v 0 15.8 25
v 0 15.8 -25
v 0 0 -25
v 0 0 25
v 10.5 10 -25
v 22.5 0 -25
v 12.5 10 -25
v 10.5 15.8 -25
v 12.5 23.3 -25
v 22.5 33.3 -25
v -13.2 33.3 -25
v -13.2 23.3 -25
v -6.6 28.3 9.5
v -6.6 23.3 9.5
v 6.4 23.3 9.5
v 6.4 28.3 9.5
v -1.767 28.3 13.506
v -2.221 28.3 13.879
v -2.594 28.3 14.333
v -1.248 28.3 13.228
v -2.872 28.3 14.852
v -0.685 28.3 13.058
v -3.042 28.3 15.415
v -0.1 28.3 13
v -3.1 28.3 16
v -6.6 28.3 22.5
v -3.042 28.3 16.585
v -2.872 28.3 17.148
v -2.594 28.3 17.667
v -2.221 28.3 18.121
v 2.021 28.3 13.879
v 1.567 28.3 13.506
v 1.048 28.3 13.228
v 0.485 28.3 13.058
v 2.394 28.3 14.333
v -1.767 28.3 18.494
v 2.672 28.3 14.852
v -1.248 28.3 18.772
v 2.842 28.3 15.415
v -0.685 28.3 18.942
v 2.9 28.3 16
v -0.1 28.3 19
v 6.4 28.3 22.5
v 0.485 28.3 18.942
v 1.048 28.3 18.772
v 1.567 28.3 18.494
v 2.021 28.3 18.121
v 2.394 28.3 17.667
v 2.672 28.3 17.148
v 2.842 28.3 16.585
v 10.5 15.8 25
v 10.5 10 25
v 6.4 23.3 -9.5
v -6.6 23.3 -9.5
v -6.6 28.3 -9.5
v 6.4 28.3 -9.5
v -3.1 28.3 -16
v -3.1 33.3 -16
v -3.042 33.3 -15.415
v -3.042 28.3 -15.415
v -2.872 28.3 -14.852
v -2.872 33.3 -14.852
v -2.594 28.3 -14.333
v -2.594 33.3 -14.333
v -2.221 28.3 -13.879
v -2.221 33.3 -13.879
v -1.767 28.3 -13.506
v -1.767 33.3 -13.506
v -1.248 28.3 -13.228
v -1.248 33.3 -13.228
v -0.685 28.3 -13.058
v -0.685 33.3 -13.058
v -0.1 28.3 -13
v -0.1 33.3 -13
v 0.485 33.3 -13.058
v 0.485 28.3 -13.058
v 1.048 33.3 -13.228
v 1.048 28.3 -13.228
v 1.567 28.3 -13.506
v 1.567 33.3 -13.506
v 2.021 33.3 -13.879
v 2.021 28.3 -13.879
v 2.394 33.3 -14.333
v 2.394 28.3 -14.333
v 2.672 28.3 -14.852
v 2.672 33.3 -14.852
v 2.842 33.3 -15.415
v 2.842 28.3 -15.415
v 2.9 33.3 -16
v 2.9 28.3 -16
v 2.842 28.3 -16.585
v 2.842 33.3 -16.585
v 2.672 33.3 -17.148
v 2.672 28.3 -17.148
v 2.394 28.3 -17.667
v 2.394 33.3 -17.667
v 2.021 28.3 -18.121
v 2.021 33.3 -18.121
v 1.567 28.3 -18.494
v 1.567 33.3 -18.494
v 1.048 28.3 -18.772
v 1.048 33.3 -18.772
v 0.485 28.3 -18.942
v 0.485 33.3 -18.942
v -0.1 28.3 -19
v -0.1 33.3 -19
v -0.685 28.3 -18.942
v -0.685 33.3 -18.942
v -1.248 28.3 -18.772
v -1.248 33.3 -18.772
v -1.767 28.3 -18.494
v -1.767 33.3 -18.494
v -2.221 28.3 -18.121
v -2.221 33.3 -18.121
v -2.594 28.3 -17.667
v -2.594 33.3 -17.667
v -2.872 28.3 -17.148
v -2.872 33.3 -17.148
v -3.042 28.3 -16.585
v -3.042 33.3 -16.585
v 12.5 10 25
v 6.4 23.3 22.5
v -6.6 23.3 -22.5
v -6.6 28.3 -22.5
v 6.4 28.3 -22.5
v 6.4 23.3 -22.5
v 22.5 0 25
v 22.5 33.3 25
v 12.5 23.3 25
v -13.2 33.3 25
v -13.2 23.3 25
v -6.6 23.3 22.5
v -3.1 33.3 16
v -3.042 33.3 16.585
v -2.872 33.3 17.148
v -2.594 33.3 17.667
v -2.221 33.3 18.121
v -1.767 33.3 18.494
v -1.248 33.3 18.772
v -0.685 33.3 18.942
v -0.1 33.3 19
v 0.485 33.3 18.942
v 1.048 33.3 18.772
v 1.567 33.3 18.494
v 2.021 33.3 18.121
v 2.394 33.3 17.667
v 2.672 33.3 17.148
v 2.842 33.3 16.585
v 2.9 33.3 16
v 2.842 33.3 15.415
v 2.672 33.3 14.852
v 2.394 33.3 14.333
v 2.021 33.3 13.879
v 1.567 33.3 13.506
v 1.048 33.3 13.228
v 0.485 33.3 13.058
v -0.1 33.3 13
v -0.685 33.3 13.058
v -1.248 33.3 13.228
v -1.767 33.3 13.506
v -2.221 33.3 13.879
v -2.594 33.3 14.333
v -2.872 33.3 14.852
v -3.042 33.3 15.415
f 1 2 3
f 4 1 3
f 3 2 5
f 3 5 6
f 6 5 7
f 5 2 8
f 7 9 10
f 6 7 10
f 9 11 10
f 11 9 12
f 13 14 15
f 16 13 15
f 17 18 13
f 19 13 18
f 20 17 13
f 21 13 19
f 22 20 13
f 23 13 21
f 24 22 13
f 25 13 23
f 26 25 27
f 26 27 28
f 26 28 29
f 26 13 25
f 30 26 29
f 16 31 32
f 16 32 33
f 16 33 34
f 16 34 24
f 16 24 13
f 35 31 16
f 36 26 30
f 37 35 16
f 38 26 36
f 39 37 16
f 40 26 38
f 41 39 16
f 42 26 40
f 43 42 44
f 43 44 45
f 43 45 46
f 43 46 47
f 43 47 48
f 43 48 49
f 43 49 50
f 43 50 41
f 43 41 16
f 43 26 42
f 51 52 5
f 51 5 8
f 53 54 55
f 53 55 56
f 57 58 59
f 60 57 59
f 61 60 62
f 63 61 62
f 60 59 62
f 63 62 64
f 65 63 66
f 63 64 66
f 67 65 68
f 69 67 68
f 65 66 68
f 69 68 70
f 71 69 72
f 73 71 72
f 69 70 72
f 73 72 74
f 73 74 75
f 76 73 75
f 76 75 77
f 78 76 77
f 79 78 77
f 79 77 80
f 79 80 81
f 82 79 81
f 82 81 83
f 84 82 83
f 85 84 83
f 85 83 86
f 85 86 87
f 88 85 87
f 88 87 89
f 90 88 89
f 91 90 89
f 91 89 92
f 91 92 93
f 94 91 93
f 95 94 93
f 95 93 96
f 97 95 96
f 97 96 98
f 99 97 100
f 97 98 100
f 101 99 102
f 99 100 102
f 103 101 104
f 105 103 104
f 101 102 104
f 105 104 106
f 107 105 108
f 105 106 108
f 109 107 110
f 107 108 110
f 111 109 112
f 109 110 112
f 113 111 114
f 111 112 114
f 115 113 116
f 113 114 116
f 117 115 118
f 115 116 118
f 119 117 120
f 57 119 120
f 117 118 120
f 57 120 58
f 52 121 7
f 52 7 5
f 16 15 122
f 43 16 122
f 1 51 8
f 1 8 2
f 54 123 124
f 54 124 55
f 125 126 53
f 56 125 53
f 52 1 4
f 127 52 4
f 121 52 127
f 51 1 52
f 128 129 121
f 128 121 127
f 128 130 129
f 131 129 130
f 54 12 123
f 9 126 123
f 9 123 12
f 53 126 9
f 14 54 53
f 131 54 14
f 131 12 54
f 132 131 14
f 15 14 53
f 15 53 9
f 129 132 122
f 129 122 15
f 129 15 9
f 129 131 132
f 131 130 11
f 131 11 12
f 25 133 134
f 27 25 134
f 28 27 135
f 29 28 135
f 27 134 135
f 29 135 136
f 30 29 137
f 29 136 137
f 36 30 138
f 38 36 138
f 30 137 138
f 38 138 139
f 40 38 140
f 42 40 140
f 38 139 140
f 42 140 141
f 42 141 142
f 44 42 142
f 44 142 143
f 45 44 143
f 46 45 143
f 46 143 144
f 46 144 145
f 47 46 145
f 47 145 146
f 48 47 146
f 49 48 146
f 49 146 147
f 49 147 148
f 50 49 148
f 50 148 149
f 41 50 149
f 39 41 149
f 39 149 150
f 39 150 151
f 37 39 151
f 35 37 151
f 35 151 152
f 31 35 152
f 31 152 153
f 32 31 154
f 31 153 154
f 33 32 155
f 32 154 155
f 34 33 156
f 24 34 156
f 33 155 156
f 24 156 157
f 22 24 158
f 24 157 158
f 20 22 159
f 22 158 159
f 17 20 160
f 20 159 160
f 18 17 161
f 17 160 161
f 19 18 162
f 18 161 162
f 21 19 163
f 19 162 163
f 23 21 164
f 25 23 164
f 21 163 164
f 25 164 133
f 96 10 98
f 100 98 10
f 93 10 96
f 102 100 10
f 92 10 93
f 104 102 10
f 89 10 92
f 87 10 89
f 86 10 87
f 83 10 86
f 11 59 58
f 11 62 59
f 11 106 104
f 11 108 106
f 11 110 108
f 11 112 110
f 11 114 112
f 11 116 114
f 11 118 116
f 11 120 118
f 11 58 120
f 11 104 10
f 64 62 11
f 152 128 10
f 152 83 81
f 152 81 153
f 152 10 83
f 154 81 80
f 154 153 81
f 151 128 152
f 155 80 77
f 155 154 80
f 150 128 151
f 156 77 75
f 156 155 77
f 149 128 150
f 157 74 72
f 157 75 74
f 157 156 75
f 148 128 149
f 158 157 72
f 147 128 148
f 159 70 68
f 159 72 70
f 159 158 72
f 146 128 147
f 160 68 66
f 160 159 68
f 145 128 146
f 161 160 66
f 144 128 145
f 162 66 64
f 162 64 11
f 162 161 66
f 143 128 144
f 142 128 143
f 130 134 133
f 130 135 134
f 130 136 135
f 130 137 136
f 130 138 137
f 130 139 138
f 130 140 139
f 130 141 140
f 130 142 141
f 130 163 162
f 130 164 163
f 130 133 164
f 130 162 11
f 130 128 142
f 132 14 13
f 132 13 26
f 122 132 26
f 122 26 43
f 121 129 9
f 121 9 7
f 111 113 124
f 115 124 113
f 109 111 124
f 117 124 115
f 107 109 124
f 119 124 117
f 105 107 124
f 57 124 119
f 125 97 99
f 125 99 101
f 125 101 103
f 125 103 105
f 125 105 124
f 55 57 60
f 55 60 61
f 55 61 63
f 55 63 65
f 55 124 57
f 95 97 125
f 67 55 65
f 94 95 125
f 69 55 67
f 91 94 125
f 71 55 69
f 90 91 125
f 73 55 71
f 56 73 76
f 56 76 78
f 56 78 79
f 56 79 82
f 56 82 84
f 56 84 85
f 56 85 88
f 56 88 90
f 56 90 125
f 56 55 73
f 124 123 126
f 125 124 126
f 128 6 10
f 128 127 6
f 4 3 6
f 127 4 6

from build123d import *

# Parameters (mm, degrees)
F1_DEPTH = 25
F2_R     = 3
F3_DEPTH = 10
F4_W     = 13
F4_H     = 13
F5_DEPTH = 5


with BuildPart() as f1:
    # F0 (on Top) → F1 (new body, symmetric)
    with BuildSketch(Plane.XY):
        Polygon((22.5, 0), (22.5, 33.3), (-13.2, 33.3), (-13.2, 23.3), (12.5, 23.3), (12.5, 10), (10.5, 10), (10.5, 15.8), (0, 15.8), (0, 0), align=None)
    extrude(amount=F1_DEPTH, both=True)

    # F2 (on face) → F3 (cut, through all)
    with BuildSketch(Plane(origin=(0, 33.3, 0), x_dir=(-1, 0, 0), z_dir=(0, 1, 0))):
        with Locations((0.1, -16)):
            Circle(F2_R)
        with Locations((0.1, 16)):
            Circle(F2_R)
    extrude(amount=-F3_DEPTH, mode=Mode.SUBTRACT)

    # F4 (on face) → F5 (cut)
    with BuildSketch(Plane.XZ.offset(-23.3)):
        with Locations((-0.1, 16)):
            Rectangle(F4_W, F4_H)
        with Locations((-0.1, -16)):
            Rectangle(F4_W, F4_H)
    extrude(amount=-F5_DEPTH, mode=Mode.SUBTRACT)


solid = f1.part
